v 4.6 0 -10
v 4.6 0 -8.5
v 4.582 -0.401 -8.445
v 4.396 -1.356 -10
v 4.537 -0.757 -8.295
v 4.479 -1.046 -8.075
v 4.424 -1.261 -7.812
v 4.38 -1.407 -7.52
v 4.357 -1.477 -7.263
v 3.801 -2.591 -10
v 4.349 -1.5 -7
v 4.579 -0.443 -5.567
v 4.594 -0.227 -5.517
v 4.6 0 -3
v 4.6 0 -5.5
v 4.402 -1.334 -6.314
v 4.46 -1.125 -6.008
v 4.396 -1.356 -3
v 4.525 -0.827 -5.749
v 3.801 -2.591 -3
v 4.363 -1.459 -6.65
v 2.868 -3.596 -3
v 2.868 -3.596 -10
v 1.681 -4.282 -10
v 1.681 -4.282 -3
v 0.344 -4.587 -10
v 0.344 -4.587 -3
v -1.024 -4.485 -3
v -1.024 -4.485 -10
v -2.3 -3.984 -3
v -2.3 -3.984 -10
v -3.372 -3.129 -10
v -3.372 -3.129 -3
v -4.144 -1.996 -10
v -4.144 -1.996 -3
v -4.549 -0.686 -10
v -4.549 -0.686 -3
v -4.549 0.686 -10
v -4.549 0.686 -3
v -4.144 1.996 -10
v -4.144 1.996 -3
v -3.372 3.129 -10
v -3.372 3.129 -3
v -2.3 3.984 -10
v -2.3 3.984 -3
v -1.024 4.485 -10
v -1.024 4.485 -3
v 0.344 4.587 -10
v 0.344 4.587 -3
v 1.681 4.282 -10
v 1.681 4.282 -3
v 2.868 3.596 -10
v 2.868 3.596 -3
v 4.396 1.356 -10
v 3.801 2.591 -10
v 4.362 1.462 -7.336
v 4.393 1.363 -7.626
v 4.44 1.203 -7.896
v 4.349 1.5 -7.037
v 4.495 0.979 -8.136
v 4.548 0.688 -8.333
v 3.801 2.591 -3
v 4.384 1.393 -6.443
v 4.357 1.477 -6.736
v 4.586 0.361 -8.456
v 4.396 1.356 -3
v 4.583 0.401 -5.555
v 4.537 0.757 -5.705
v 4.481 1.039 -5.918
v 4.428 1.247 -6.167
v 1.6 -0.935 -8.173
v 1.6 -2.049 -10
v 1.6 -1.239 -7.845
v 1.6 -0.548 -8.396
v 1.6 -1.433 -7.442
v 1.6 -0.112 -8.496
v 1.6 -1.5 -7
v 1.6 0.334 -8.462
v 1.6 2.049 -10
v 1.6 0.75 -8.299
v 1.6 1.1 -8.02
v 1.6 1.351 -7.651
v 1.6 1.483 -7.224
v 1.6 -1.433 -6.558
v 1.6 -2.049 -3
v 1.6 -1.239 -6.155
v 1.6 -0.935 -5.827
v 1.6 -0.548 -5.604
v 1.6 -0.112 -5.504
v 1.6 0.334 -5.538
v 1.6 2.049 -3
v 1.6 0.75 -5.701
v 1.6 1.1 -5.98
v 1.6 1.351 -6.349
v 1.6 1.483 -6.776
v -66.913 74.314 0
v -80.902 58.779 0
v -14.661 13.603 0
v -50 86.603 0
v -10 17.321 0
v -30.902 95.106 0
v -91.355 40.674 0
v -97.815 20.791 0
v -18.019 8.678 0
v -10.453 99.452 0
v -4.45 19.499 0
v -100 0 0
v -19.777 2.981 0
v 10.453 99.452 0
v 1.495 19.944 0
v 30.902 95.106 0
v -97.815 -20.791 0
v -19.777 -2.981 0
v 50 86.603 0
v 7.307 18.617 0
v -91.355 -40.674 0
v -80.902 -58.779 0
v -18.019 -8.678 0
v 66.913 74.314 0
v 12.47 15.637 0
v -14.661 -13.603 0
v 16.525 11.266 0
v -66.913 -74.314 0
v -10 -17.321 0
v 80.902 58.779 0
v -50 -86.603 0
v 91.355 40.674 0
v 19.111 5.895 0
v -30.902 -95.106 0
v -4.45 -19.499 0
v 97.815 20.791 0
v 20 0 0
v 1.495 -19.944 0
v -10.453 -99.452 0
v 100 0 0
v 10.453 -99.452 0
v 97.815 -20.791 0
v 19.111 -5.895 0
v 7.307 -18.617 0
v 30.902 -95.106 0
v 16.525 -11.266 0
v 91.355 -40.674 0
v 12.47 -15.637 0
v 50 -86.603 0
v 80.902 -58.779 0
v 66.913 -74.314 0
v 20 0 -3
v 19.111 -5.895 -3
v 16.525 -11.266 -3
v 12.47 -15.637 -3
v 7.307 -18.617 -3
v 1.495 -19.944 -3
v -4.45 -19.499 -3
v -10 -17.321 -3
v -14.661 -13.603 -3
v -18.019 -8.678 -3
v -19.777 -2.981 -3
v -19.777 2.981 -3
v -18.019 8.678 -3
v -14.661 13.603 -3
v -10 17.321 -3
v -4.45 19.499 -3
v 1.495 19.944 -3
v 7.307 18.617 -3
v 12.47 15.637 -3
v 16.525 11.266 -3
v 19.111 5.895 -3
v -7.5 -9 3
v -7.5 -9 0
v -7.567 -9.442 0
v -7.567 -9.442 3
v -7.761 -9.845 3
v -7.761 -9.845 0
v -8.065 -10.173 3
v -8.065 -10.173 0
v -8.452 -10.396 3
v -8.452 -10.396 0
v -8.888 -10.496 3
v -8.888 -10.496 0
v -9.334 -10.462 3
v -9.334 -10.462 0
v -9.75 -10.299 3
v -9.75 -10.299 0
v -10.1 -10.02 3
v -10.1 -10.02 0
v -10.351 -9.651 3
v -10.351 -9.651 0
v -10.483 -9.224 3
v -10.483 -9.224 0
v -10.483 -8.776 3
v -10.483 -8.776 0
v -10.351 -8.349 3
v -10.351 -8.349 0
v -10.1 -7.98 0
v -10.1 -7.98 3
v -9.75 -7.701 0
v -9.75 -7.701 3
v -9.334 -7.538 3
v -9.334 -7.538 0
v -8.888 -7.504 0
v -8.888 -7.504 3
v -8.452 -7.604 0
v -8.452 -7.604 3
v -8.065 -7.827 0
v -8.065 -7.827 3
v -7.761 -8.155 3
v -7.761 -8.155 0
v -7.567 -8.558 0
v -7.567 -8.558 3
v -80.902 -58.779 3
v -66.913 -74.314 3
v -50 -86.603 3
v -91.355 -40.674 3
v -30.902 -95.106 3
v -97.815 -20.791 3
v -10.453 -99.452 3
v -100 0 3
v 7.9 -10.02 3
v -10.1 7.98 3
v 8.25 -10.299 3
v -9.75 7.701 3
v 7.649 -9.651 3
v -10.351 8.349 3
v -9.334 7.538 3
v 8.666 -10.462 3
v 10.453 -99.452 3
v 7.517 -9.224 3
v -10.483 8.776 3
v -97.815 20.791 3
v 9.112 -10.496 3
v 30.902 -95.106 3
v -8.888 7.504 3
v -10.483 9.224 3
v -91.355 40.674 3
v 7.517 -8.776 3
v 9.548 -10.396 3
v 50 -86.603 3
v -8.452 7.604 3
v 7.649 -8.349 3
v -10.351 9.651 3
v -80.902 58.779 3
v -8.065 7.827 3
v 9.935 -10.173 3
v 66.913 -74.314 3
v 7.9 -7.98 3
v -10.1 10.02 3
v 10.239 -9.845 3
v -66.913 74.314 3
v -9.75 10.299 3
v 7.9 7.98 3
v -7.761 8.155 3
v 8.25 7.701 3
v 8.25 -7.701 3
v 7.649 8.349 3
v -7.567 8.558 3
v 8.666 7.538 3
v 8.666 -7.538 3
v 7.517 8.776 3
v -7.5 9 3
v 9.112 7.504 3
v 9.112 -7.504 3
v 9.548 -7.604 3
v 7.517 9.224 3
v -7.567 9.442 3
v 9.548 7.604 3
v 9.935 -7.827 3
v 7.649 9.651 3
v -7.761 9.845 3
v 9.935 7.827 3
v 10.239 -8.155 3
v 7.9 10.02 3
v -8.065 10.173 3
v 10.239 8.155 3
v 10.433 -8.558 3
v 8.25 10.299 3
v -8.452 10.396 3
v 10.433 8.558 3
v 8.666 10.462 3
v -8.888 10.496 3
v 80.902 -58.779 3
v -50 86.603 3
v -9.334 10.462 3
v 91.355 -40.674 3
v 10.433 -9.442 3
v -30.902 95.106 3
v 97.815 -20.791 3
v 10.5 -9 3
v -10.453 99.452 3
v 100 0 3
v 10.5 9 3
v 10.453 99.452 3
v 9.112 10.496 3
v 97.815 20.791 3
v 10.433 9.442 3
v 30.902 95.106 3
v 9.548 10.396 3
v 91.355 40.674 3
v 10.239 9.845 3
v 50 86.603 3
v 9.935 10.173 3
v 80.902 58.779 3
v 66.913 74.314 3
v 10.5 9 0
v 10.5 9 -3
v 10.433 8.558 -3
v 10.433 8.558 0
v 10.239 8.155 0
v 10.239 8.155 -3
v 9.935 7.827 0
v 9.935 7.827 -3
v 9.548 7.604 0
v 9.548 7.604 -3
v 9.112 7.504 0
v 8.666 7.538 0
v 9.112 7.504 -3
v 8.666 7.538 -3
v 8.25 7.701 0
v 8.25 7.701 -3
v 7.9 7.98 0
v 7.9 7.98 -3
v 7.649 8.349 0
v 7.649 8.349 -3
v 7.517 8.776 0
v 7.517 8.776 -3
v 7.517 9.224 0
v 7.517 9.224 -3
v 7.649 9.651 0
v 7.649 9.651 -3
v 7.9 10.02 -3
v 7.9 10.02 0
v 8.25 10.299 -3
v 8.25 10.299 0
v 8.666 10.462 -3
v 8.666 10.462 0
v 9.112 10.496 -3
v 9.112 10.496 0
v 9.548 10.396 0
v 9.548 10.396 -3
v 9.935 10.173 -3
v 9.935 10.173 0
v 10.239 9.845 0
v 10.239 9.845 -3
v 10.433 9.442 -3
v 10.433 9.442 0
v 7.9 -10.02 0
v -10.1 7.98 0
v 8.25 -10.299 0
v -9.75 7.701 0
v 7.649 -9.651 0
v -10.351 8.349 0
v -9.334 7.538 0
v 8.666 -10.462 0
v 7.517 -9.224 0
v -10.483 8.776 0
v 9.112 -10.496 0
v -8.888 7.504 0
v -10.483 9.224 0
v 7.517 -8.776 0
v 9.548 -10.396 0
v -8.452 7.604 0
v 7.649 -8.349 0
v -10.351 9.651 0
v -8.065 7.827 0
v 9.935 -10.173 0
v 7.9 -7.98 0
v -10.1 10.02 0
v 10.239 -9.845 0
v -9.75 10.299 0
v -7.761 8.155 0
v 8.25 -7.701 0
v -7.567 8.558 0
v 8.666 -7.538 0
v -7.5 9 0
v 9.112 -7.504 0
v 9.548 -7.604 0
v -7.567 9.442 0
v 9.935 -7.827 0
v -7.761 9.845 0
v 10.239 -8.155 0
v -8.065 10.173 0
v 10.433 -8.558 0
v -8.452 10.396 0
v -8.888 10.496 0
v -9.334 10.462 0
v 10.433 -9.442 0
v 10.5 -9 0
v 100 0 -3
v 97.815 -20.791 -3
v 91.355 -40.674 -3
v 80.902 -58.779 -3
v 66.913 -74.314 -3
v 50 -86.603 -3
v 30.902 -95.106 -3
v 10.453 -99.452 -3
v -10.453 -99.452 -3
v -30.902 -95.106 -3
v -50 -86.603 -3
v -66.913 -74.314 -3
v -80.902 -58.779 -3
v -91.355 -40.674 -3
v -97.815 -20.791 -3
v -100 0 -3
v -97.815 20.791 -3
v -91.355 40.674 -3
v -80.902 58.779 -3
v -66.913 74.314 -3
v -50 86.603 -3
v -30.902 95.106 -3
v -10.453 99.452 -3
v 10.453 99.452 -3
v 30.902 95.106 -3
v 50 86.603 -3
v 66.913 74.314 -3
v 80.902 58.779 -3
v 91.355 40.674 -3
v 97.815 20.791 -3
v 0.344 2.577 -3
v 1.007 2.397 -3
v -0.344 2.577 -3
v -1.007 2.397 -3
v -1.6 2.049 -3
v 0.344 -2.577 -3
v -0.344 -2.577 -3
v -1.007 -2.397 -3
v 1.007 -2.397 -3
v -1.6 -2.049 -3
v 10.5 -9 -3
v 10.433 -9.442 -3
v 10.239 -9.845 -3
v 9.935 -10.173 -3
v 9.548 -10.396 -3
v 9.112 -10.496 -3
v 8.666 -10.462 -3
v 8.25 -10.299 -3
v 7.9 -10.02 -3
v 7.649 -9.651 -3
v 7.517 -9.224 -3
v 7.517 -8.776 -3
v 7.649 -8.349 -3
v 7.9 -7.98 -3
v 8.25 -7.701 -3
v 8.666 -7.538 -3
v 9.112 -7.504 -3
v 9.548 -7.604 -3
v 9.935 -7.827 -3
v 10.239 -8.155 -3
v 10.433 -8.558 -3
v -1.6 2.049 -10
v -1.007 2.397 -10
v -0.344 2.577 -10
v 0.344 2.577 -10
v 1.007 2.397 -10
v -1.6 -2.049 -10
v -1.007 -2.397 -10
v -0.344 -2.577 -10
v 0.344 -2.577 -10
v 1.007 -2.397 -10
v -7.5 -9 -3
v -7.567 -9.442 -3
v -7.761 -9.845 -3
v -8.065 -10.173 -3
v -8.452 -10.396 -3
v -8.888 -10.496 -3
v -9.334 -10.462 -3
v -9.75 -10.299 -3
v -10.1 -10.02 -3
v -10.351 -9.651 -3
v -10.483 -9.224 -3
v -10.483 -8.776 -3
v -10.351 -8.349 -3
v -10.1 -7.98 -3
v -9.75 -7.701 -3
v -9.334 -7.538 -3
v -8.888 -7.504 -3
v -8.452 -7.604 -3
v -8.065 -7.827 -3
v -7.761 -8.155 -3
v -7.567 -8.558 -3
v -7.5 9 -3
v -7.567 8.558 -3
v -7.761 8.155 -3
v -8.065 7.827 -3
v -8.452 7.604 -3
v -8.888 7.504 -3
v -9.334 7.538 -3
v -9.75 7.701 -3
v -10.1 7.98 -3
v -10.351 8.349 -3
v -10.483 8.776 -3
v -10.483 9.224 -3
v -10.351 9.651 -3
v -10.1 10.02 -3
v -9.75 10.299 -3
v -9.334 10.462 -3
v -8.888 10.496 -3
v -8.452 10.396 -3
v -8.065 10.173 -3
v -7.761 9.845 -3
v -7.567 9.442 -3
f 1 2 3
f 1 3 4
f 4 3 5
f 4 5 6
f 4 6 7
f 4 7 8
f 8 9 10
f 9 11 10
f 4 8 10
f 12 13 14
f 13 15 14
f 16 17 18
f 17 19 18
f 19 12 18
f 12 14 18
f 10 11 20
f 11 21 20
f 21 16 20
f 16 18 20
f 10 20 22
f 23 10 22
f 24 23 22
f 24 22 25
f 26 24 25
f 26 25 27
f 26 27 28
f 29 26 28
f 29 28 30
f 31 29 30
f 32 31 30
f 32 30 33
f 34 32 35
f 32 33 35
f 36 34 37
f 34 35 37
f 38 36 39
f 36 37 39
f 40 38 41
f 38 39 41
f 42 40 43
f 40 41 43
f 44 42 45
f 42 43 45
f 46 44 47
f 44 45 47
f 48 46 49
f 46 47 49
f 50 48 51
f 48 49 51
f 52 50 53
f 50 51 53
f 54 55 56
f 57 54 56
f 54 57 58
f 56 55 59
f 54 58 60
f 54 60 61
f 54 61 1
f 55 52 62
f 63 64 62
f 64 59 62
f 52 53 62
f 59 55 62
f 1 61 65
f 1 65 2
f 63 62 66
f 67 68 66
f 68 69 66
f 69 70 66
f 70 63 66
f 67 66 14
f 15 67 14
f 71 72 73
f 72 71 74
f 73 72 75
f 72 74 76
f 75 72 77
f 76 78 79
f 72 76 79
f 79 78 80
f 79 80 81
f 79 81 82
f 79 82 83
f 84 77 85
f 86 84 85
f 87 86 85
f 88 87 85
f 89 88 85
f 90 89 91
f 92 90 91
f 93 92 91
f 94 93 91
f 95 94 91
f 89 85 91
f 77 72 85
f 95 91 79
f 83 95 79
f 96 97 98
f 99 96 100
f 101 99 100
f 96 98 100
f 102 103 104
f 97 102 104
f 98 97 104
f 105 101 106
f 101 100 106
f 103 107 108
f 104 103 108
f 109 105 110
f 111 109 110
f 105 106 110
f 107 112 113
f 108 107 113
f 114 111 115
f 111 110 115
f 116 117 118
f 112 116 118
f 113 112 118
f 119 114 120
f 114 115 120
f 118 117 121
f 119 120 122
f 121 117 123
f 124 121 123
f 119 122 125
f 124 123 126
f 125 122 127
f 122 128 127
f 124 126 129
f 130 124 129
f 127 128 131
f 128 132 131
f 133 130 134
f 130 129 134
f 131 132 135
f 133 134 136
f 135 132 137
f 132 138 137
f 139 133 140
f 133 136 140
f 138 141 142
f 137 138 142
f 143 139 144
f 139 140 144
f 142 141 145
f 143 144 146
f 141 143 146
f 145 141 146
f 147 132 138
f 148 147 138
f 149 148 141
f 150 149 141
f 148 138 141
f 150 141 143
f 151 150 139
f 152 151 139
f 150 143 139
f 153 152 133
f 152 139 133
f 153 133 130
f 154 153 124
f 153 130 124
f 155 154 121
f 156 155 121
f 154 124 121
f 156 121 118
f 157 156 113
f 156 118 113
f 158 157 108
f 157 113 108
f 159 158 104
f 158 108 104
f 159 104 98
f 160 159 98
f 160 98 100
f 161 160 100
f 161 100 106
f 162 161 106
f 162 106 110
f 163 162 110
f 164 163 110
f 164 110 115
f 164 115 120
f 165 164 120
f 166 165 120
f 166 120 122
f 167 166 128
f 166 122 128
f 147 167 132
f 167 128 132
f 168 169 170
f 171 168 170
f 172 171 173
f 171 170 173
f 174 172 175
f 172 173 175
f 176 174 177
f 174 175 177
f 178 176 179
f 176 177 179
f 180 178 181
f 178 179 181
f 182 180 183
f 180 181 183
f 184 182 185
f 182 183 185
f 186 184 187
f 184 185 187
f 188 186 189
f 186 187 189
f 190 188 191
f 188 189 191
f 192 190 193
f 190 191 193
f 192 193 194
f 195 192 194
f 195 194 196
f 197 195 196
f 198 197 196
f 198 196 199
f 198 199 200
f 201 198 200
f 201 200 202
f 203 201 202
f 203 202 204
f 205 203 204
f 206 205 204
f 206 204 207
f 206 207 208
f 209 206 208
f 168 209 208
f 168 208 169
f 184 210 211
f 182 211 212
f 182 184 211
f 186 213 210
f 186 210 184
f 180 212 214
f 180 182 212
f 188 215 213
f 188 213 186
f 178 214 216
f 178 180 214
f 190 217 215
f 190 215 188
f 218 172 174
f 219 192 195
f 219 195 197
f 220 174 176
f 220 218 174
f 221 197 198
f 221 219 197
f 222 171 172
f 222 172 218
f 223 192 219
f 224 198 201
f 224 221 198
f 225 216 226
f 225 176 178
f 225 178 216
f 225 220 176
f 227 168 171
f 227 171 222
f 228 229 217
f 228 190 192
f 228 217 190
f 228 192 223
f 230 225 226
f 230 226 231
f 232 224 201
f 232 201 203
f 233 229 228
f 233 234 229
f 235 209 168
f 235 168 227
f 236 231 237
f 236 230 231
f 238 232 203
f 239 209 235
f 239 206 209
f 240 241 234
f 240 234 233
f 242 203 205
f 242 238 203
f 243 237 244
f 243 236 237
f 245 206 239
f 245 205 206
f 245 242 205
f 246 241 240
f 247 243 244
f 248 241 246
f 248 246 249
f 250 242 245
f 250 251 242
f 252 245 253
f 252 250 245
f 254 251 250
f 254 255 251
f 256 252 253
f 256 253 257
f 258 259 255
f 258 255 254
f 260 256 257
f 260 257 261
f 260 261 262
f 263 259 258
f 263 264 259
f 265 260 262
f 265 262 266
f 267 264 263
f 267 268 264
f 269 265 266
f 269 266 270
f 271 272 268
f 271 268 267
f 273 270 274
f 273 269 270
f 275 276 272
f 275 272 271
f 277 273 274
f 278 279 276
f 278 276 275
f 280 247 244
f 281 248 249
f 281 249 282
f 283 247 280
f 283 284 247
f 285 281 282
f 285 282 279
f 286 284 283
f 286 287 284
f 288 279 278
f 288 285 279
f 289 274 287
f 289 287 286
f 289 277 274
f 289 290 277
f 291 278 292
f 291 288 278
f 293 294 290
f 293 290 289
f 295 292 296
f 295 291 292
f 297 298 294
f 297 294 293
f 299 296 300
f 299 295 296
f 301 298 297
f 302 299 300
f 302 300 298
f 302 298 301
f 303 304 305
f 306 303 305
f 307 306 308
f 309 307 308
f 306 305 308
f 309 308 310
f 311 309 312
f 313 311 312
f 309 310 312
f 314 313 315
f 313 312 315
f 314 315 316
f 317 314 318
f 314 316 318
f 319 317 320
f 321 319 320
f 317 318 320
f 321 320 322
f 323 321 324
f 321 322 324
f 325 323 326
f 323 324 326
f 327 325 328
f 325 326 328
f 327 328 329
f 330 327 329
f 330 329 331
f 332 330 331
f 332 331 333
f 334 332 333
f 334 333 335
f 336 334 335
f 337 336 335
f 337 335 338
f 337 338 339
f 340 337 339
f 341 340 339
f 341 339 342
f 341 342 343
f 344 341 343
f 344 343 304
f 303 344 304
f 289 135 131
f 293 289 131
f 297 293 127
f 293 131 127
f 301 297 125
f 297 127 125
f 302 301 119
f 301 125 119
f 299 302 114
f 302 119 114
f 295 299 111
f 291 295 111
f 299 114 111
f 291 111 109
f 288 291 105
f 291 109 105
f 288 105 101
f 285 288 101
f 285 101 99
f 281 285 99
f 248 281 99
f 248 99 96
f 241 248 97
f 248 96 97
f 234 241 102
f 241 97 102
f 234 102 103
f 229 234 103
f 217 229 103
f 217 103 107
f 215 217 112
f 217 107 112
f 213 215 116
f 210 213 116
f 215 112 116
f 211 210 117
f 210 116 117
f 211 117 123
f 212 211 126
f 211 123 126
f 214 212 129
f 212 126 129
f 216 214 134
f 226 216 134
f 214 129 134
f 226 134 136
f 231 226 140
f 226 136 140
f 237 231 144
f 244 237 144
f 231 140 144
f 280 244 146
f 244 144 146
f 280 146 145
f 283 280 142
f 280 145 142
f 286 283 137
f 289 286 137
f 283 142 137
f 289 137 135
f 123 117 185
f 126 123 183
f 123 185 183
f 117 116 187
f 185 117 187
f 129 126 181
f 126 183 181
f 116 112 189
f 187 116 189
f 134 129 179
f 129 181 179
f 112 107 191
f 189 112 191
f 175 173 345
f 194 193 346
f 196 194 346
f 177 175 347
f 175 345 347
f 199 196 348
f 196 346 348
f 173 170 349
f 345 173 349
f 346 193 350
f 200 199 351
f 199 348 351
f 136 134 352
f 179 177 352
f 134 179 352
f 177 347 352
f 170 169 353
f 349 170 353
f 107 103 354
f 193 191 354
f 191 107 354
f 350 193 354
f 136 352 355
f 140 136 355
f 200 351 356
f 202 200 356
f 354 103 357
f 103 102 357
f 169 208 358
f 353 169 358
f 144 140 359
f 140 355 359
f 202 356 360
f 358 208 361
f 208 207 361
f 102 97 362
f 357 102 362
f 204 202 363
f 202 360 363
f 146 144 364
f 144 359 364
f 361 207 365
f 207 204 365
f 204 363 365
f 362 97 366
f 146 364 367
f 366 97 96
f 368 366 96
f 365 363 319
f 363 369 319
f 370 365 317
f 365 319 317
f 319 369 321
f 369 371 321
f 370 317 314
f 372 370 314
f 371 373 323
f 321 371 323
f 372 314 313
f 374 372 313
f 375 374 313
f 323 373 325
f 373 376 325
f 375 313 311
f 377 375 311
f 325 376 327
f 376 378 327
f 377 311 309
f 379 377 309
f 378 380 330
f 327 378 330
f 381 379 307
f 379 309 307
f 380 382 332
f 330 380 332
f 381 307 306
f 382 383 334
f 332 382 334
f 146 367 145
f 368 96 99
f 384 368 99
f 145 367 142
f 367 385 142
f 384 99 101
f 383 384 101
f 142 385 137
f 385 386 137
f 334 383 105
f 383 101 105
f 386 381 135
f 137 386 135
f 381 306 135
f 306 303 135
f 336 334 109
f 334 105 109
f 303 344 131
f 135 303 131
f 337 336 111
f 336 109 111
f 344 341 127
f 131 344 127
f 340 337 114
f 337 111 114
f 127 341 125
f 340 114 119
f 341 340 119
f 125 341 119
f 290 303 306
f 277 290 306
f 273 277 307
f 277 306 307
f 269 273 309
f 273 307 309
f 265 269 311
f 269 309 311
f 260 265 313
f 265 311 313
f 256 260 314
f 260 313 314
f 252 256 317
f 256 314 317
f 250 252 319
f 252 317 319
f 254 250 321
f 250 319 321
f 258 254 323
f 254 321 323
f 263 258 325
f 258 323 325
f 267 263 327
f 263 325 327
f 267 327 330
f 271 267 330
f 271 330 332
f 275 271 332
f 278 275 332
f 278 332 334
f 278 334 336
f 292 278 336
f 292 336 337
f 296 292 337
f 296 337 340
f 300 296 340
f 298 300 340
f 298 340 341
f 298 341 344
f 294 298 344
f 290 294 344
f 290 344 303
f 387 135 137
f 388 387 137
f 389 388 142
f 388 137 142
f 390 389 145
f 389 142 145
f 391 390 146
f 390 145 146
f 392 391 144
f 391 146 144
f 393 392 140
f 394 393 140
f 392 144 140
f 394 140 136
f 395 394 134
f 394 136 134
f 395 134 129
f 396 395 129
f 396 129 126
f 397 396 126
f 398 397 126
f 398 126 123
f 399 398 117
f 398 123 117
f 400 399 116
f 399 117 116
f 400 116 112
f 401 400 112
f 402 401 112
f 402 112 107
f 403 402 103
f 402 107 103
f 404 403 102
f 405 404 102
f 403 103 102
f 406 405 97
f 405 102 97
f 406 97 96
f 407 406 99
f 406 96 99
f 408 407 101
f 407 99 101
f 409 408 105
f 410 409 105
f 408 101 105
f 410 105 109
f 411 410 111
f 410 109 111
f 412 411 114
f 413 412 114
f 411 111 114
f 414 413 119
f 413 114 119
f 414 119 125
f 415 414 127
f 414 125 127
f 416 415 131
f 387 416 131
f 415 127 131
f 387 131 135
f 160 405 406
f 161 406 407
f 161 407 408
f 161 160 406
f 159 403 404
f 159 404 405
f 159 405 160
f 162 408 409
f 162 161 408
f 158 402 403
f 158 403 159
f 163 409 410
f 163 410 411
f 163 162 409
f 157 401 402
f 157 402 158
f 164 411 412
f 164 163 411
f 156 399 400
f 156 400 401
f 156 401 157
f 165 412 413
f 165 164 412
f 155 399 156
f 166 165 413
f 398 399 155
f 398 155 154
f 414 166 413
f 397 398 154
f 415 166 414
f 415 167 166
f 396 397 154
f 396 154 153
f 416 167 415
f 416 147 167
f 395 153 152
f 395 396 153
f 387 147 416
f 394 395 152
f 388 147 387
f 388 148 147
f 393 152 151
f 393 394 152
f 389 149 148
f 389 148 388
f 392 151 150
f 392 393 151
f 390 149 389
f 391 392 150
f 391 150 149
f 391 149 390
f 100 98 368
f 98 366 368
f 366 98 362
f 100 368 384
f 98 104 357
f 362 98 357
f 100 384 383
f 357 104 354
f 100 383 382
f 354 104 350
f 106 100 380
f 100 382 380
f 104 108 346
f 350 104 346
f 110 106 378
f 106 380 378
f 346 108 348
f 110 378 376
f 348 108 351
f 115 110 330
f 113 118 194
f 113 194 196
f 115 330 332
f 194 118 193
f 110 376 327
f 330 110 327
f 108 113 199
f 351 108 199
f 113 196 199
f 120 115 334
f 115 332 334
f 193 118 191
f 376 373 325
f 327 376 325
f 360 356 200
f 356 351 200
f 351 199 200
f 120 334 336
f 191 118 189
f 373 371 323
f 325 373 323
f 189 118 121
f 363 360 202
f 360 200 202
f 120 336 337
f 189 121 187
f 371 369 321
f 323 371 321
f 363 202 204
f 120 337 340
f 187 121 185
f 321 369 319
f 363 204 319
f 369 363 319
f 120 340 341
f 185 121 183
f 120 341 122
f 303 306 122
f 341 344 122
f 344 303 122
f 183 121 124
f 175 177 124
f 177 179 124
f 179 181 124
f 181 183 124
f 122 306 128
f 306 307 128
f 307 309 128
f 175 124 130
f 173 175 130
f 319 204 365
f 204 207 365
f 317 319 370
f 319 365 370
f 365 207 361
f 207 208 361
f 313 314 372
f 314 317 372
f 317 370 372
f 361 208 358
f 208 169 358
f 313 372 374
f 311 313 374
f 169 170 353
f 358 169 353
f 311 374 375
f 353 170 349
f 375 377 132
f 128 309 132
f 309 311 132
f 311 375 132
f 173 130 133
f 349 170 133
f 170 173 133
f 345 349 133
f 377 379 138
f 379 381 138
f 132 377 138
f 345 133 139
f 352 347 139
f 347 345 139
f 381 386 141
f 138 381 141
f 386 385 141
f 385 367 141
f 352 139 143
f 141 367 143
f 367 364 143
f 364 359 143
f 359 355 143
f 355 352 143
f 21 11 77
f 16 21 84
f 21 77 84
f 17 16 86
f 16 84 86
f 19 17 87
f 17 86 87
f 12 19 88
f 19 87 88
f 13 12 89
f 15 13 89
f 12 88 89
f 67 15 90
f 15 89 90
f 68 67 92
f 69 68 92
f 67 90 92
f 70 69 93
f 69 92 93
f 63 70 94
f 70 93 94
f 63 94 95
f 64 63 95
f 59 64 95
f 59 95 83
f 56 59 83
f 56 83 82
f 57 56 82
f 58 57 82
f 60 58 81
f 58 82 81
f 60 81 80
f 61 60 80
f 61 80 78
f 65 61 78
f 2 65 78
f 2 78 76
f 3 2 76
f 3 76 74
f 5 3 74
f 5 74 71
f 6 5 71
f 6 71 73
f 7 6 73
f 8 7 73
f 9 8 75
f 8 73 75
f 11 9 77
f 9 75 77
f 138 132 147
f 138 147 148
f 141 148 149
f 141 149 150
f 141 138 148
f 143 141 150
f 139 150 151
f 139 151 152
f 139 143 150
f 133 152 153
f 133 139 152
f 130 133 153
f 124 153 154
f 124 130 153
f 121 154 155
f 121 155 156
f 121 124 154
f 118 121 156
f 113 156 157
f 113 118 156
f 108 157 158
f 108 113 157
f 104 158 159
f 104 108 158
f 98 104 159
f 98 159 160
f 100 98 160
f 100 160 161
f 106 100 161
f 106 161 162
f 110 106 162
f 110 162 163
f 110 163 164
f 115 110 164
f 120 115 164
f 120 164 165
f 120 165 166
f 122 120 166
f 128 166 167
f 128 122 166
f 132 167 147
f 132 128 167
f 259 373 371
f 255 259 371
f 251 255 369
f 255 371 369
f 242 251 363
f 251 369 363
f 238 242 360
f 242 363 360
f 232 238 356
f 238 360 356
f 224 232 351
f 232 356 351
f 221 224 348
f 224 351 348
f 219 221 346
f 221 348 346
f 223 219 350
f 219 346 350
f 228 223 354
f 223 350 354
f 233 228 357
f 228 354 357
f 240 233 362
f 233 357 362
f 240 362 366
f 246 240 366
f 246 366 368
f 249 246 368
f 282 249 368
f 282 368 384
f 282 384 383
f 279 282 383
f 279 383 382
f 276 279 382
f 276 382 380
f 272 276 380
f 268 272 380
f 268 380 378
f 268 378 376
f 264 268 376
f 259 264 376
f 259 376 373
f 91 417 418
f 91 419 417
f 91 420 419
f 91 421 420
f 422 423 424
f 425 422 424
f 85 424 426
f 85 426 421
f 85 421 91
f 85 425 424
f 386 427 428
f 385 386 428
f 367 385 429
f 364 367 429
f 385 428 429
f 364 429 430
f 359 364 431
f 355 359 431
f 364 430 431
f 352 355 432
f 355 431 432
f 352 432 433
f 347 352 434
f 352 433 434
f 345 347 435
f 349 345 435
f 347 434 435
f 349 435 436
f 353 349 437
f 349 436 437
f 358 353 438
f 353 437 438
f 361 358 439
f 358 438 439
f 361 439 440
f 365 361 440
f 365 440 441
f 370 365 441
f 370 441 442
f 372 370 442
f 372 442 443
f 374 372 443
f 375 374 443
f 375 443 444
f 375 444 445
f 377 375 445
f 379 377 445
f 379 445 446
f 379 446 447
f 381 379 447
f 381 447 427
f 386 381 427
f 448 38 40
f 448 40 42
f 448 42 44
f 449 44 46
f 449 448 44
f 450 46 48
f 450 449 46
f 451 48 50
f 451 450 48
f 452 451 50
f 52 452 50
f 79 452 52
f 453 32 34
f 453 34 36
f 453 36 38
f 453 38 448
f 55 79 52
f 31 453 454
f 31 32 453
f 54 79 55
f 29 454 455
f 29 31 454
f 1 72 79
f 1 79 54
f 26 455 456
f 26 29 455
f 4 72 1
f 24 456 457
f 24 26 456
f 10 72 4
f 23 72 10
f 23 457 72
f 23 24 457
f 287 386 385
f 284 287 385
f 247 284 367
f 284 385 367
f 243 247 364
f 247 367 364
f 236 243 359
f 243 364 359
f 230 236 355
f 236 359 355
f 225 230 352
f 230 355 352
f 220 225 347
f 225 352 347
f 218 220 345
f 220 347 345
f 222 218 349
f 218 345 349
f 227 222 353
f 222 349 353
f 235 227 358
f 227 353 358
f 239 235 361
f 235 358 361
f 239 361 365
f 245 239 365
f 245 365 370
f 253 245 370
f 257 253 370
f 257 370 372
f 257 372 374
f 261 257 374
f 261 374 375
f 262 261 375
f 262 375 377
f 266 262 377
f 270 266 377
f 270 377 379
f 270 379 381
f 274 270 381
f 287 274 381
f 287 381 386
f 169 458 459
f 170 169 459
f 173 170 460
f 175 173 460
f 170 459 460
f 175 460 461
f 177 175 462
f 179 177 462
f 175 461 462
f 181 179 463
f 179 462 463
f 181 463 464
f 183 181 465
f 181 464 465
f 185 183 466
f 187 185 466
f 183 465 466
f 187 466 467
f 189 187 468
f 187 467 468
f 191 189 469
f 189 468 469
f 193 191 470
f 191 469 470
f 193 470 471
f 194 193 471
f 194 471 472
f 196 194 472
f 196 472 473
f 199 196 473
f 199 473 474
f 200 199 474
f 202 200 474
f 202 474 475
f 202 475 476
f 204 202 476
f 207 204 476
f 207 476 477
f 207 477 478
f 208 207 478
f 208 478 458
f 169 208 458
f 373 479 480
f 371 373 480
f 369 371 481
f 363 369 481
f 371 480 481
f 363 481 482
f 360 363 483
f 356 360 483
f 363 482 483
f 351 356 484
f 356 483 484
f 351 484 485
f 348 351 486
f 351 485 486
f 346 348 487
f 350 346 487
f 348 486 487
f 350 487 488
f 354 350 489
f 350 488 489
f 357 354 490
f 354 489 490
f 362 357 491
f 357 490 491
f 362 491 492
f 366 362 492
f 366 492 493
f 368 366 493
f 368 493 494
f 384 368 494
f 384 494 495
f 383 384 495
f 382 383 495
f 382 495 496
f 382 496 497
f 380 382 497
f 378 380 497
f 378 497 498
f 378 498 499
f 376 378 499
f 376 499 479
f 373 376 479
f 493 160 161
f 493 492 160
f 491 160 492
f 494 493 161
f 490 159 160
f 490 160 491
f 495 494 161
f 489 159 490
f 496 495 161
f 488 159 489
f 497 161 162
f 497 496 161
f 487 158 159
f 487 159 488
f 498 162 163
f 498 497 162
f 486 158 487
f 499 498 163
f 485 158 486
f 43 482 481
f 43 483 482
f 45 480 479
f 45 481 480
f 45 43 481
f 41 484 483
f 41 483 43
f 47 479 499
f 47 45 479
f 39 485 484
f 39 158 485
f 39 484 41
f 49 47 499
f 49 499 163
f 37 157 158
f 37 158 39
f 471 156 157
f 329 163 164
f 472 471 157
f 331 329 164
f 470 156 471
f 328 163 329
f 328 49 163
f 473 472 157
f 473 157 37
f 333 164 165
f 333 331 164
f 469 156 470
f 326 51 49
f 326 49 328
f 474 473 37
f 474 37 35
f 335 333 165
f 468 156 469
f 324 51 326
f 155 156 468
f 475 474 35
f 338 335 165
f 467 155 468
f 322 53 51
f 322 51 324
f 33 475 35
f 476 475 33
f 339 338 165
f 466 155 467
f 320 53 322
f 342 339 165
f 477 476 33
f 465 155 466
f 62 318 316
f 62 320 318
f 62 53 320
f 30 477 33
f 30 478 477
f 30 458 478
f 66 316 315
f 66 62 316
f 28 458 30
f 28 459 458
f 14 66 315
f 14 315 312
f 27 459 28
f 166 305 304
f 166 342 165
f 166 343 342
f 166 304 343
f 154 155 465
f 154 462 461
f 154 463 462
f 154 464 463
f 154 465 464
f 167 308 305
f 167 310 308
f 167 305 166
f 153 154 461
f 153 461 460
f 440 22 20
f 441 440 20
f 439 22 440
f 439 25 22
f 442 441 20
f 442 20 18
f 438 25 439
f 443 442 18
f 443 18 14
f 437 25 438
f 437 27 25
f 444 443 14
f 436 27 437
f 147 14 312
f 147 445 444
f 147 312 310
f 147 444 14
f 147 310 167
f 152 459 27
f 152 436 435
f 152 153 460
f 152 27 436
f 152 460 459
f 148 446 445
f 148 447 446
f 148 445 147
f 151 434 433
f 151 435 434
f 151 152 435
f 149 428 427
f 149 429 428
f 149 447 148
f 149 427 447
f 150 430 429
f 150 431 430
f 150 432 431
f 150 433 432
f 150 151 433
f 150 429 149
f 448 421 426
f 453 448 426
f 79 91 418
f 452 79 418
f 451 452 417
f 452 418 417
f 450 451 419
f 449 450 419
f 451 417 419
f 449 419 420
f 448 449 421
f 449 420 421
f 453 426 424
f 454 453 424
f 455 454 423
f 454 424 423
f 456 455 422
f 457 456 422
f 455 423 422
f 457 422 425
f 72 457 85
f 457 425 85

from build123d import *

# Parameters (mm, degrees)
F0_R      = 100
F1_DEPTH  = 3
F2_R      = 20
F3_DEPTH  = 3
F4_R      = 4.6
F5_DEPTH  = 7
F6_R      = 1.5
F7_DEPTH  = 25
F8_R      = 100
F8_R_2    = 20
F9_DEPTH  = 3
F10_R     = 1.5
F11_DEPTH = 25


with BuildPart() as f1:
    # F0 (on Top) → F1 (new body)
    with BuildSketch(Plane.XY):
        Circle(F0_R)
    extrude(amount=F1_DEPTH)


with BuildPart() as f3:
    # F2 (on face) → F3 (new body)
    with BuildSketch(Plane(origin=(0, 0, 0), x_dir=(1, 0, 0), z_dir=(0, 0, -1))):
        Circle(F2_R)
    extrude(amount=F3_DEPTH)

    # F4 (on face) → F5 (join)
    with BuildSketch(Plane(origin=(0, 0, -3), x_dir=(1, 0, 0), z_dir=(0, 0, -1))):
        Circle(F4_R)
        with BuildLine():
            ThreePointArc((1.6, -2.04939), (0, -2.6), (-1.6, -2.04939))
            Line((-1.6, -2.04939), (-1.6, 2.04939))
            ThreePointArc((-1.6, 2.04939), (0, 2.6), (1.6, 2.04939))
            Line((1.6, 2.04939), (1.6, -2.04939))
        make_face(mode=Mode.SUBTRACT)
    extrude(amount=F5_DEPTH)

    # F6 (on face) → F7 (cut)
    with BuildSketch(Plane(origin=(1.6, 0, 0), x_dir=(0, -1, 0), z_dir=(-1, 0, 0))):
        with Locations((0, -7)):
            Circle(F6_R)
    extrude(amount=-F7_DEPTH, mode=Mode.SUBTRACT)


with BuildPart() as f9:
    # F8 (on face) → F9 (new body)
    with BuildSketch(Plane(origin=(0, 0, 0), x_dir=(1, 0, 0), z_dir=(0, 0, -1))):
        Circle(F8_R)
        Circle(F8_R_2, mode=Mode.SUBTRACT)
    extrude(amount=F9_DEPTH)


with BuildPart() as f11_tool:
    # F10 (on face) → F11 (new body)
    with BuildSketch(Plane(origin=(0, 0, -3), x_dir=(1, 0, 0), z_dir=(0, 0, -1))):
        with Locations((-9, 9)):
            Circle(F10_R)
        with Locations((9, 9)):
            Circle(F10_R)
        with Locations((9, -9)):
            Circle(F10_R)
        with Locations((-9, -9)):
            Circle(F10_R)
    extrude(amount=-F11_DEPTH)


with BuildPart() as f1_1:
    add(f1.part)

    # F11: cut by f11_tool
    add(f11_tool.part, mode=Mode.SUBTRACT)


with BuildPart() as f3_1:
    add(f3.part)

    # F11: cut by f11_tool
    add(f11_tool.part, mode=Mode.SUBTRACT)


solid = Compound([f9.part, f1_1.part, f3_1.part])
